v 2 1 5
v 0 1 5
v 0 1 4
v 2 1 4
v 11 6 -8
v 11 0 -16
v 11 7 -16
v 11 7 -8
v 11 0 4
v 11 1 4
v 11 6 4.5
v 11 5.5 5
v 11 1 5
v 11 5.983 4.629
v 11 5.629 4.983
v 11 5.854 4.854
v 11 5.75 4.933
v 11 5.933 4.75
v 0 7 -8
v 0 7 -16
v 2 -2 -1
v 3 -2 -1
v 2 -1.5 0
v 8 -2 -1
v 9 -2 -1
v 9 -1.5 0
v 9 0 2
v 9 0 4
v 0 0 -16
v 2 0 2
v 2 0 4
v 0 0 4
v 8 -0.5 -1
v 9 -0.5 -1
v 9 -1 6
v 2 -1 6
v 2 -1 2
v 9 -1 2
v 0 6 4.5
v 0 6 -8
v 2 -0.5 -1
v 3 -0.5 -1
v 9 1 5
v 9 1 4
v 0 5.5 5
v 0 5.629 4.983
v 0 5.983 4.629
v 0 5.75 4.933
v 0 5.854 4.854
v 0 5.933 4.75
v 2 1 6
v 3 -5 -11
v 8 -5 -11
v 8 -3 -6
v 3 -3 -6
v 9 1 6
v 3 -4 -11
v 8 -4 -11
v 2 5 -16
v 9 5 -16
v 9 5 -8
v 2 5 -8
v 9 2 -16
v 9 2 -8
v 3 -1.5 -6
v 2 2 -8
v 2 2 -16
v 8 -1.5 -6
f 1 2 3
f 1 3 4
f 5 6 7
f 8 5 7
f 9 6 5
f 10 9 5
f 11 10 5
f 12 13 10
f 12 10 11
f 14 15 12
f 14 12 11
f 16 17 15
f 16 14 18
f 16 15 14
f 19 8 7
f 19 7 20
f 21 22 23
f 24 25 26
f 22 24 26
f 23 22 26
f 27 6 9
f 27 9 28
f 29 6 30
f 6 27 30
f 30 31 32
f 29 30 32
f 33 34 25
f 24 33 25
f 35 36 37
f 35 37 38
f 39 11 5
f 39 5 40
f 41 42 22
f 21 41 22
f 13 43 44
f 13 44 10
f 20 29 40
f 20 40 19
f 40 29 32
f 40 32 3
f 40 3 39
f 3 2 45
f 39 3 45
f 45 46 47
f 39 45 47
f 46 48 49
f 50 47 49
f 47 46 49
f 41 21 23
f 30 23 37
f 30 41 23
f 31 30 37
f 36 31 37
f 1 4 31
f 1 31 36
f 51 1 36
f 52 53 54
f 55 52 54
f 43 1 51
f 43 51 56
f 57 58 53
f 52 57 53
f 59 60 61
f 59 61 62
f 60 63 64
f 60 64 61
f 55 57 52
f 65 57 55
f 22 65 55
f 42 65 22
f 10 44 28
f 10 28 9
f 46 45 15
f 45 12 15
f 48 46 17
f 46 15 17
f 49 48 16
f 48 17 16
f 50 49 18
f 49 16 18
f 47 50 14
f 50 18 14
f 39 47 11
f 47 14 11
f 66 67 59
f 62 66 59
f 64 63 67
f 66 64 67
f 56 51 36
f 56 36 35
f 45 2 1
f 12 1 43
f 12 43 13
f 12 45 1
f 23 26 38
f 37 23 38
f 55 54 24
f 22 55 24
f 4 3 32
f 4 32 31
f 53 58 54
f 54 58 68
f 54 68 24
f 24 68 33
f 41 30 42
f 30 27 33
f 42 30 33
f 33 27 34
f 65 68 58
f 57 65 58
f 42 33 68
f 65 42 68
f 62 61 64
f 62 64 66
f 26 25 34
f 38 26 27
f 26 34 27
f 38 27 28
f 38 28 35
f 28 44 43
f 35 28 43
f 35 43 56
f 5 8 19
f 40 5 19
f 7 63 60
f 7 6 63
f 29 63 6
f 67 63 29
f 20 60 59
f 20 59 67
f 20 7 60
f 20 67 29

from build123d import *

# Parameters (mm, degrees)
SKETCH_2_W          = 11
SKETCH_2_H          = 6
EXTRUDE_1_DEPTH     = 5
SKETCH_3_W          = 11
SKETCH_3_H          = 6
EXTRUDE_2_DEPTH     = 8
SKETCH_4_W          = 11
SKETCH_4_H          = 7
EXTRUDE_3_DEPTH     = 8
SKETCH_6_W          = 7
SKETCH_6_H          = 2
EXTRUDE_4_DEPTH     = 1
SKETCH_8_W          = 2
SKETCH_8_H          = 1
CUT_EXTRUDE_1_DEPTH = 1
SKETCH_10_W         = 7
SKETCH_10_H         = 3
EXTRUDE_5_DEPTH     = 1
EXTRUDE_6_DEPTH     = 7
EXTRUDE_7_DEPTH     = 5
SKETCH_14_W         = 7
SKETCH_14_H         = 3
CUT_EXTRUDE_2_DEPTH = 8
FILLET_1_R          = 0.5


with BuildPart() as part:
    # Эскиз2 → Бобышка-Вытянуть1 (new body)
    with BuildSketch(Plane.XY):
        with Locations((5.5, 3)):
            Rectangle(SKETCH_2_W, SKETCH_2_H)
    extrude(amount=EXTRUDE_1_DEPTH)

    # Эскиз3 → Бобышка-Вытянуть2 (add)
    with BuildSketch(Plane(origin=(0, 0, 0), x_dir=(-1, 0, 0), z_dir=(0, 0, -1))):
        with Locations((-5.5, 3)):
            Rectangle(SKETCH_3_W, SKETCH_3_H)
    extrude(amount=EXTRUDE_2_DEPTH)

    # Эскиз4 → Бобышка-Вытянуть3 (add)
    with BuildSketch(Plane(origin=(0, 0, -8), x_dir=(-1, 0, 0), z_dir=(0, 0, -1))):
        with Locations((-5.5, 3.5)):
            Rectangle(SKETCH_4_W, SKETCH_4_H)
    extrude(amount=EXTRUDE_3_DEPTH)

    # Эскиз6 → Бобышка-Вытянуть4 (add)
    with BuildSketch(Plane.XY.offset(5)):
        with Locations((5.5, 0)):
            Rectangle(SKETCH_6_W, SKETCH_6_H)
    extrude(amount=EXTRUDE_4_DEPTH)

    # Эскиз8 → Вырез-Вытянуть1 (cut)
    with BuildSketch(Plane.XY.offset(5)):
        with Locations((1, 0.5)):
            Rectangle(SKETCH_8_W, SKETCH_8_H)
        with Locations((10, 0.5)):
            Rectangle(SKETCH_8_W, SKETCH_8_H)
    extrude(amount=-CUT_EXTRUDE_1_DEPTH, mode=Mode.SUBTRACT)

    # Эскиз10 → Бобышка-Вытянуть5 (add)
    with BuildSketch(Plane.XZ):
        with Locations((5.5, 3.5)):
            Rectangle(SKETCH_10_W, SKETCH_10_H)
    extrude(amount=EXTRUDE_5_DEPTH)

    # Эскиз12 → Бобышка-Вытянуть6 (add)
    with BuildSketch(Plane(origin=(9, 0, 0), x_dir=(0, 0, -1), z_dir=(1, 0, 0))):
        Polygon((-2, 0), (1, -0.5), (1, -2), (0, -1.5), (-2, -1), align=None)
    extrude(amount=-EXTRUDE_6_DEPTH)

    # Эскиз13 → Бобышка-Вытянуть7 (add)
    with BuildSketch(Plane(origin=(8, 0, 0), x_dir=(0, 0, -1), z_dir=(1, 0, 0))):
        Polygon((1, -0.5), (6, -1.5), (11, -4), (11, -5), (6, -3), (1, -2), align=None)
    extrude(amount=-EXTRUDE_7_DEPTH)

    # Эскиз14 → Вырез-Вытянуть2 (cut)
    with BuildSketch(Plane(origin=(0, 0, -16), x_dir=(-1, 0, 0), z_dir=(0, 0, -1))):
        with Locations((-5.5, 3.5)):
            Rectangle(SKETCH_14_W, SKETCH_14_H)
    extrude(amount=-CUT_EXTRUDE_2_DEPTH, mode=Mode.SUBTRACT)

    # Скругление1
    fillet_1_edges = [part.edges().sort_by_distance(p)[0] for p in [
        (5.5, 6, 5),
    ]]
    fillet(fillet_1_edges, radius=FILLET_1_R)


solid = part.part
